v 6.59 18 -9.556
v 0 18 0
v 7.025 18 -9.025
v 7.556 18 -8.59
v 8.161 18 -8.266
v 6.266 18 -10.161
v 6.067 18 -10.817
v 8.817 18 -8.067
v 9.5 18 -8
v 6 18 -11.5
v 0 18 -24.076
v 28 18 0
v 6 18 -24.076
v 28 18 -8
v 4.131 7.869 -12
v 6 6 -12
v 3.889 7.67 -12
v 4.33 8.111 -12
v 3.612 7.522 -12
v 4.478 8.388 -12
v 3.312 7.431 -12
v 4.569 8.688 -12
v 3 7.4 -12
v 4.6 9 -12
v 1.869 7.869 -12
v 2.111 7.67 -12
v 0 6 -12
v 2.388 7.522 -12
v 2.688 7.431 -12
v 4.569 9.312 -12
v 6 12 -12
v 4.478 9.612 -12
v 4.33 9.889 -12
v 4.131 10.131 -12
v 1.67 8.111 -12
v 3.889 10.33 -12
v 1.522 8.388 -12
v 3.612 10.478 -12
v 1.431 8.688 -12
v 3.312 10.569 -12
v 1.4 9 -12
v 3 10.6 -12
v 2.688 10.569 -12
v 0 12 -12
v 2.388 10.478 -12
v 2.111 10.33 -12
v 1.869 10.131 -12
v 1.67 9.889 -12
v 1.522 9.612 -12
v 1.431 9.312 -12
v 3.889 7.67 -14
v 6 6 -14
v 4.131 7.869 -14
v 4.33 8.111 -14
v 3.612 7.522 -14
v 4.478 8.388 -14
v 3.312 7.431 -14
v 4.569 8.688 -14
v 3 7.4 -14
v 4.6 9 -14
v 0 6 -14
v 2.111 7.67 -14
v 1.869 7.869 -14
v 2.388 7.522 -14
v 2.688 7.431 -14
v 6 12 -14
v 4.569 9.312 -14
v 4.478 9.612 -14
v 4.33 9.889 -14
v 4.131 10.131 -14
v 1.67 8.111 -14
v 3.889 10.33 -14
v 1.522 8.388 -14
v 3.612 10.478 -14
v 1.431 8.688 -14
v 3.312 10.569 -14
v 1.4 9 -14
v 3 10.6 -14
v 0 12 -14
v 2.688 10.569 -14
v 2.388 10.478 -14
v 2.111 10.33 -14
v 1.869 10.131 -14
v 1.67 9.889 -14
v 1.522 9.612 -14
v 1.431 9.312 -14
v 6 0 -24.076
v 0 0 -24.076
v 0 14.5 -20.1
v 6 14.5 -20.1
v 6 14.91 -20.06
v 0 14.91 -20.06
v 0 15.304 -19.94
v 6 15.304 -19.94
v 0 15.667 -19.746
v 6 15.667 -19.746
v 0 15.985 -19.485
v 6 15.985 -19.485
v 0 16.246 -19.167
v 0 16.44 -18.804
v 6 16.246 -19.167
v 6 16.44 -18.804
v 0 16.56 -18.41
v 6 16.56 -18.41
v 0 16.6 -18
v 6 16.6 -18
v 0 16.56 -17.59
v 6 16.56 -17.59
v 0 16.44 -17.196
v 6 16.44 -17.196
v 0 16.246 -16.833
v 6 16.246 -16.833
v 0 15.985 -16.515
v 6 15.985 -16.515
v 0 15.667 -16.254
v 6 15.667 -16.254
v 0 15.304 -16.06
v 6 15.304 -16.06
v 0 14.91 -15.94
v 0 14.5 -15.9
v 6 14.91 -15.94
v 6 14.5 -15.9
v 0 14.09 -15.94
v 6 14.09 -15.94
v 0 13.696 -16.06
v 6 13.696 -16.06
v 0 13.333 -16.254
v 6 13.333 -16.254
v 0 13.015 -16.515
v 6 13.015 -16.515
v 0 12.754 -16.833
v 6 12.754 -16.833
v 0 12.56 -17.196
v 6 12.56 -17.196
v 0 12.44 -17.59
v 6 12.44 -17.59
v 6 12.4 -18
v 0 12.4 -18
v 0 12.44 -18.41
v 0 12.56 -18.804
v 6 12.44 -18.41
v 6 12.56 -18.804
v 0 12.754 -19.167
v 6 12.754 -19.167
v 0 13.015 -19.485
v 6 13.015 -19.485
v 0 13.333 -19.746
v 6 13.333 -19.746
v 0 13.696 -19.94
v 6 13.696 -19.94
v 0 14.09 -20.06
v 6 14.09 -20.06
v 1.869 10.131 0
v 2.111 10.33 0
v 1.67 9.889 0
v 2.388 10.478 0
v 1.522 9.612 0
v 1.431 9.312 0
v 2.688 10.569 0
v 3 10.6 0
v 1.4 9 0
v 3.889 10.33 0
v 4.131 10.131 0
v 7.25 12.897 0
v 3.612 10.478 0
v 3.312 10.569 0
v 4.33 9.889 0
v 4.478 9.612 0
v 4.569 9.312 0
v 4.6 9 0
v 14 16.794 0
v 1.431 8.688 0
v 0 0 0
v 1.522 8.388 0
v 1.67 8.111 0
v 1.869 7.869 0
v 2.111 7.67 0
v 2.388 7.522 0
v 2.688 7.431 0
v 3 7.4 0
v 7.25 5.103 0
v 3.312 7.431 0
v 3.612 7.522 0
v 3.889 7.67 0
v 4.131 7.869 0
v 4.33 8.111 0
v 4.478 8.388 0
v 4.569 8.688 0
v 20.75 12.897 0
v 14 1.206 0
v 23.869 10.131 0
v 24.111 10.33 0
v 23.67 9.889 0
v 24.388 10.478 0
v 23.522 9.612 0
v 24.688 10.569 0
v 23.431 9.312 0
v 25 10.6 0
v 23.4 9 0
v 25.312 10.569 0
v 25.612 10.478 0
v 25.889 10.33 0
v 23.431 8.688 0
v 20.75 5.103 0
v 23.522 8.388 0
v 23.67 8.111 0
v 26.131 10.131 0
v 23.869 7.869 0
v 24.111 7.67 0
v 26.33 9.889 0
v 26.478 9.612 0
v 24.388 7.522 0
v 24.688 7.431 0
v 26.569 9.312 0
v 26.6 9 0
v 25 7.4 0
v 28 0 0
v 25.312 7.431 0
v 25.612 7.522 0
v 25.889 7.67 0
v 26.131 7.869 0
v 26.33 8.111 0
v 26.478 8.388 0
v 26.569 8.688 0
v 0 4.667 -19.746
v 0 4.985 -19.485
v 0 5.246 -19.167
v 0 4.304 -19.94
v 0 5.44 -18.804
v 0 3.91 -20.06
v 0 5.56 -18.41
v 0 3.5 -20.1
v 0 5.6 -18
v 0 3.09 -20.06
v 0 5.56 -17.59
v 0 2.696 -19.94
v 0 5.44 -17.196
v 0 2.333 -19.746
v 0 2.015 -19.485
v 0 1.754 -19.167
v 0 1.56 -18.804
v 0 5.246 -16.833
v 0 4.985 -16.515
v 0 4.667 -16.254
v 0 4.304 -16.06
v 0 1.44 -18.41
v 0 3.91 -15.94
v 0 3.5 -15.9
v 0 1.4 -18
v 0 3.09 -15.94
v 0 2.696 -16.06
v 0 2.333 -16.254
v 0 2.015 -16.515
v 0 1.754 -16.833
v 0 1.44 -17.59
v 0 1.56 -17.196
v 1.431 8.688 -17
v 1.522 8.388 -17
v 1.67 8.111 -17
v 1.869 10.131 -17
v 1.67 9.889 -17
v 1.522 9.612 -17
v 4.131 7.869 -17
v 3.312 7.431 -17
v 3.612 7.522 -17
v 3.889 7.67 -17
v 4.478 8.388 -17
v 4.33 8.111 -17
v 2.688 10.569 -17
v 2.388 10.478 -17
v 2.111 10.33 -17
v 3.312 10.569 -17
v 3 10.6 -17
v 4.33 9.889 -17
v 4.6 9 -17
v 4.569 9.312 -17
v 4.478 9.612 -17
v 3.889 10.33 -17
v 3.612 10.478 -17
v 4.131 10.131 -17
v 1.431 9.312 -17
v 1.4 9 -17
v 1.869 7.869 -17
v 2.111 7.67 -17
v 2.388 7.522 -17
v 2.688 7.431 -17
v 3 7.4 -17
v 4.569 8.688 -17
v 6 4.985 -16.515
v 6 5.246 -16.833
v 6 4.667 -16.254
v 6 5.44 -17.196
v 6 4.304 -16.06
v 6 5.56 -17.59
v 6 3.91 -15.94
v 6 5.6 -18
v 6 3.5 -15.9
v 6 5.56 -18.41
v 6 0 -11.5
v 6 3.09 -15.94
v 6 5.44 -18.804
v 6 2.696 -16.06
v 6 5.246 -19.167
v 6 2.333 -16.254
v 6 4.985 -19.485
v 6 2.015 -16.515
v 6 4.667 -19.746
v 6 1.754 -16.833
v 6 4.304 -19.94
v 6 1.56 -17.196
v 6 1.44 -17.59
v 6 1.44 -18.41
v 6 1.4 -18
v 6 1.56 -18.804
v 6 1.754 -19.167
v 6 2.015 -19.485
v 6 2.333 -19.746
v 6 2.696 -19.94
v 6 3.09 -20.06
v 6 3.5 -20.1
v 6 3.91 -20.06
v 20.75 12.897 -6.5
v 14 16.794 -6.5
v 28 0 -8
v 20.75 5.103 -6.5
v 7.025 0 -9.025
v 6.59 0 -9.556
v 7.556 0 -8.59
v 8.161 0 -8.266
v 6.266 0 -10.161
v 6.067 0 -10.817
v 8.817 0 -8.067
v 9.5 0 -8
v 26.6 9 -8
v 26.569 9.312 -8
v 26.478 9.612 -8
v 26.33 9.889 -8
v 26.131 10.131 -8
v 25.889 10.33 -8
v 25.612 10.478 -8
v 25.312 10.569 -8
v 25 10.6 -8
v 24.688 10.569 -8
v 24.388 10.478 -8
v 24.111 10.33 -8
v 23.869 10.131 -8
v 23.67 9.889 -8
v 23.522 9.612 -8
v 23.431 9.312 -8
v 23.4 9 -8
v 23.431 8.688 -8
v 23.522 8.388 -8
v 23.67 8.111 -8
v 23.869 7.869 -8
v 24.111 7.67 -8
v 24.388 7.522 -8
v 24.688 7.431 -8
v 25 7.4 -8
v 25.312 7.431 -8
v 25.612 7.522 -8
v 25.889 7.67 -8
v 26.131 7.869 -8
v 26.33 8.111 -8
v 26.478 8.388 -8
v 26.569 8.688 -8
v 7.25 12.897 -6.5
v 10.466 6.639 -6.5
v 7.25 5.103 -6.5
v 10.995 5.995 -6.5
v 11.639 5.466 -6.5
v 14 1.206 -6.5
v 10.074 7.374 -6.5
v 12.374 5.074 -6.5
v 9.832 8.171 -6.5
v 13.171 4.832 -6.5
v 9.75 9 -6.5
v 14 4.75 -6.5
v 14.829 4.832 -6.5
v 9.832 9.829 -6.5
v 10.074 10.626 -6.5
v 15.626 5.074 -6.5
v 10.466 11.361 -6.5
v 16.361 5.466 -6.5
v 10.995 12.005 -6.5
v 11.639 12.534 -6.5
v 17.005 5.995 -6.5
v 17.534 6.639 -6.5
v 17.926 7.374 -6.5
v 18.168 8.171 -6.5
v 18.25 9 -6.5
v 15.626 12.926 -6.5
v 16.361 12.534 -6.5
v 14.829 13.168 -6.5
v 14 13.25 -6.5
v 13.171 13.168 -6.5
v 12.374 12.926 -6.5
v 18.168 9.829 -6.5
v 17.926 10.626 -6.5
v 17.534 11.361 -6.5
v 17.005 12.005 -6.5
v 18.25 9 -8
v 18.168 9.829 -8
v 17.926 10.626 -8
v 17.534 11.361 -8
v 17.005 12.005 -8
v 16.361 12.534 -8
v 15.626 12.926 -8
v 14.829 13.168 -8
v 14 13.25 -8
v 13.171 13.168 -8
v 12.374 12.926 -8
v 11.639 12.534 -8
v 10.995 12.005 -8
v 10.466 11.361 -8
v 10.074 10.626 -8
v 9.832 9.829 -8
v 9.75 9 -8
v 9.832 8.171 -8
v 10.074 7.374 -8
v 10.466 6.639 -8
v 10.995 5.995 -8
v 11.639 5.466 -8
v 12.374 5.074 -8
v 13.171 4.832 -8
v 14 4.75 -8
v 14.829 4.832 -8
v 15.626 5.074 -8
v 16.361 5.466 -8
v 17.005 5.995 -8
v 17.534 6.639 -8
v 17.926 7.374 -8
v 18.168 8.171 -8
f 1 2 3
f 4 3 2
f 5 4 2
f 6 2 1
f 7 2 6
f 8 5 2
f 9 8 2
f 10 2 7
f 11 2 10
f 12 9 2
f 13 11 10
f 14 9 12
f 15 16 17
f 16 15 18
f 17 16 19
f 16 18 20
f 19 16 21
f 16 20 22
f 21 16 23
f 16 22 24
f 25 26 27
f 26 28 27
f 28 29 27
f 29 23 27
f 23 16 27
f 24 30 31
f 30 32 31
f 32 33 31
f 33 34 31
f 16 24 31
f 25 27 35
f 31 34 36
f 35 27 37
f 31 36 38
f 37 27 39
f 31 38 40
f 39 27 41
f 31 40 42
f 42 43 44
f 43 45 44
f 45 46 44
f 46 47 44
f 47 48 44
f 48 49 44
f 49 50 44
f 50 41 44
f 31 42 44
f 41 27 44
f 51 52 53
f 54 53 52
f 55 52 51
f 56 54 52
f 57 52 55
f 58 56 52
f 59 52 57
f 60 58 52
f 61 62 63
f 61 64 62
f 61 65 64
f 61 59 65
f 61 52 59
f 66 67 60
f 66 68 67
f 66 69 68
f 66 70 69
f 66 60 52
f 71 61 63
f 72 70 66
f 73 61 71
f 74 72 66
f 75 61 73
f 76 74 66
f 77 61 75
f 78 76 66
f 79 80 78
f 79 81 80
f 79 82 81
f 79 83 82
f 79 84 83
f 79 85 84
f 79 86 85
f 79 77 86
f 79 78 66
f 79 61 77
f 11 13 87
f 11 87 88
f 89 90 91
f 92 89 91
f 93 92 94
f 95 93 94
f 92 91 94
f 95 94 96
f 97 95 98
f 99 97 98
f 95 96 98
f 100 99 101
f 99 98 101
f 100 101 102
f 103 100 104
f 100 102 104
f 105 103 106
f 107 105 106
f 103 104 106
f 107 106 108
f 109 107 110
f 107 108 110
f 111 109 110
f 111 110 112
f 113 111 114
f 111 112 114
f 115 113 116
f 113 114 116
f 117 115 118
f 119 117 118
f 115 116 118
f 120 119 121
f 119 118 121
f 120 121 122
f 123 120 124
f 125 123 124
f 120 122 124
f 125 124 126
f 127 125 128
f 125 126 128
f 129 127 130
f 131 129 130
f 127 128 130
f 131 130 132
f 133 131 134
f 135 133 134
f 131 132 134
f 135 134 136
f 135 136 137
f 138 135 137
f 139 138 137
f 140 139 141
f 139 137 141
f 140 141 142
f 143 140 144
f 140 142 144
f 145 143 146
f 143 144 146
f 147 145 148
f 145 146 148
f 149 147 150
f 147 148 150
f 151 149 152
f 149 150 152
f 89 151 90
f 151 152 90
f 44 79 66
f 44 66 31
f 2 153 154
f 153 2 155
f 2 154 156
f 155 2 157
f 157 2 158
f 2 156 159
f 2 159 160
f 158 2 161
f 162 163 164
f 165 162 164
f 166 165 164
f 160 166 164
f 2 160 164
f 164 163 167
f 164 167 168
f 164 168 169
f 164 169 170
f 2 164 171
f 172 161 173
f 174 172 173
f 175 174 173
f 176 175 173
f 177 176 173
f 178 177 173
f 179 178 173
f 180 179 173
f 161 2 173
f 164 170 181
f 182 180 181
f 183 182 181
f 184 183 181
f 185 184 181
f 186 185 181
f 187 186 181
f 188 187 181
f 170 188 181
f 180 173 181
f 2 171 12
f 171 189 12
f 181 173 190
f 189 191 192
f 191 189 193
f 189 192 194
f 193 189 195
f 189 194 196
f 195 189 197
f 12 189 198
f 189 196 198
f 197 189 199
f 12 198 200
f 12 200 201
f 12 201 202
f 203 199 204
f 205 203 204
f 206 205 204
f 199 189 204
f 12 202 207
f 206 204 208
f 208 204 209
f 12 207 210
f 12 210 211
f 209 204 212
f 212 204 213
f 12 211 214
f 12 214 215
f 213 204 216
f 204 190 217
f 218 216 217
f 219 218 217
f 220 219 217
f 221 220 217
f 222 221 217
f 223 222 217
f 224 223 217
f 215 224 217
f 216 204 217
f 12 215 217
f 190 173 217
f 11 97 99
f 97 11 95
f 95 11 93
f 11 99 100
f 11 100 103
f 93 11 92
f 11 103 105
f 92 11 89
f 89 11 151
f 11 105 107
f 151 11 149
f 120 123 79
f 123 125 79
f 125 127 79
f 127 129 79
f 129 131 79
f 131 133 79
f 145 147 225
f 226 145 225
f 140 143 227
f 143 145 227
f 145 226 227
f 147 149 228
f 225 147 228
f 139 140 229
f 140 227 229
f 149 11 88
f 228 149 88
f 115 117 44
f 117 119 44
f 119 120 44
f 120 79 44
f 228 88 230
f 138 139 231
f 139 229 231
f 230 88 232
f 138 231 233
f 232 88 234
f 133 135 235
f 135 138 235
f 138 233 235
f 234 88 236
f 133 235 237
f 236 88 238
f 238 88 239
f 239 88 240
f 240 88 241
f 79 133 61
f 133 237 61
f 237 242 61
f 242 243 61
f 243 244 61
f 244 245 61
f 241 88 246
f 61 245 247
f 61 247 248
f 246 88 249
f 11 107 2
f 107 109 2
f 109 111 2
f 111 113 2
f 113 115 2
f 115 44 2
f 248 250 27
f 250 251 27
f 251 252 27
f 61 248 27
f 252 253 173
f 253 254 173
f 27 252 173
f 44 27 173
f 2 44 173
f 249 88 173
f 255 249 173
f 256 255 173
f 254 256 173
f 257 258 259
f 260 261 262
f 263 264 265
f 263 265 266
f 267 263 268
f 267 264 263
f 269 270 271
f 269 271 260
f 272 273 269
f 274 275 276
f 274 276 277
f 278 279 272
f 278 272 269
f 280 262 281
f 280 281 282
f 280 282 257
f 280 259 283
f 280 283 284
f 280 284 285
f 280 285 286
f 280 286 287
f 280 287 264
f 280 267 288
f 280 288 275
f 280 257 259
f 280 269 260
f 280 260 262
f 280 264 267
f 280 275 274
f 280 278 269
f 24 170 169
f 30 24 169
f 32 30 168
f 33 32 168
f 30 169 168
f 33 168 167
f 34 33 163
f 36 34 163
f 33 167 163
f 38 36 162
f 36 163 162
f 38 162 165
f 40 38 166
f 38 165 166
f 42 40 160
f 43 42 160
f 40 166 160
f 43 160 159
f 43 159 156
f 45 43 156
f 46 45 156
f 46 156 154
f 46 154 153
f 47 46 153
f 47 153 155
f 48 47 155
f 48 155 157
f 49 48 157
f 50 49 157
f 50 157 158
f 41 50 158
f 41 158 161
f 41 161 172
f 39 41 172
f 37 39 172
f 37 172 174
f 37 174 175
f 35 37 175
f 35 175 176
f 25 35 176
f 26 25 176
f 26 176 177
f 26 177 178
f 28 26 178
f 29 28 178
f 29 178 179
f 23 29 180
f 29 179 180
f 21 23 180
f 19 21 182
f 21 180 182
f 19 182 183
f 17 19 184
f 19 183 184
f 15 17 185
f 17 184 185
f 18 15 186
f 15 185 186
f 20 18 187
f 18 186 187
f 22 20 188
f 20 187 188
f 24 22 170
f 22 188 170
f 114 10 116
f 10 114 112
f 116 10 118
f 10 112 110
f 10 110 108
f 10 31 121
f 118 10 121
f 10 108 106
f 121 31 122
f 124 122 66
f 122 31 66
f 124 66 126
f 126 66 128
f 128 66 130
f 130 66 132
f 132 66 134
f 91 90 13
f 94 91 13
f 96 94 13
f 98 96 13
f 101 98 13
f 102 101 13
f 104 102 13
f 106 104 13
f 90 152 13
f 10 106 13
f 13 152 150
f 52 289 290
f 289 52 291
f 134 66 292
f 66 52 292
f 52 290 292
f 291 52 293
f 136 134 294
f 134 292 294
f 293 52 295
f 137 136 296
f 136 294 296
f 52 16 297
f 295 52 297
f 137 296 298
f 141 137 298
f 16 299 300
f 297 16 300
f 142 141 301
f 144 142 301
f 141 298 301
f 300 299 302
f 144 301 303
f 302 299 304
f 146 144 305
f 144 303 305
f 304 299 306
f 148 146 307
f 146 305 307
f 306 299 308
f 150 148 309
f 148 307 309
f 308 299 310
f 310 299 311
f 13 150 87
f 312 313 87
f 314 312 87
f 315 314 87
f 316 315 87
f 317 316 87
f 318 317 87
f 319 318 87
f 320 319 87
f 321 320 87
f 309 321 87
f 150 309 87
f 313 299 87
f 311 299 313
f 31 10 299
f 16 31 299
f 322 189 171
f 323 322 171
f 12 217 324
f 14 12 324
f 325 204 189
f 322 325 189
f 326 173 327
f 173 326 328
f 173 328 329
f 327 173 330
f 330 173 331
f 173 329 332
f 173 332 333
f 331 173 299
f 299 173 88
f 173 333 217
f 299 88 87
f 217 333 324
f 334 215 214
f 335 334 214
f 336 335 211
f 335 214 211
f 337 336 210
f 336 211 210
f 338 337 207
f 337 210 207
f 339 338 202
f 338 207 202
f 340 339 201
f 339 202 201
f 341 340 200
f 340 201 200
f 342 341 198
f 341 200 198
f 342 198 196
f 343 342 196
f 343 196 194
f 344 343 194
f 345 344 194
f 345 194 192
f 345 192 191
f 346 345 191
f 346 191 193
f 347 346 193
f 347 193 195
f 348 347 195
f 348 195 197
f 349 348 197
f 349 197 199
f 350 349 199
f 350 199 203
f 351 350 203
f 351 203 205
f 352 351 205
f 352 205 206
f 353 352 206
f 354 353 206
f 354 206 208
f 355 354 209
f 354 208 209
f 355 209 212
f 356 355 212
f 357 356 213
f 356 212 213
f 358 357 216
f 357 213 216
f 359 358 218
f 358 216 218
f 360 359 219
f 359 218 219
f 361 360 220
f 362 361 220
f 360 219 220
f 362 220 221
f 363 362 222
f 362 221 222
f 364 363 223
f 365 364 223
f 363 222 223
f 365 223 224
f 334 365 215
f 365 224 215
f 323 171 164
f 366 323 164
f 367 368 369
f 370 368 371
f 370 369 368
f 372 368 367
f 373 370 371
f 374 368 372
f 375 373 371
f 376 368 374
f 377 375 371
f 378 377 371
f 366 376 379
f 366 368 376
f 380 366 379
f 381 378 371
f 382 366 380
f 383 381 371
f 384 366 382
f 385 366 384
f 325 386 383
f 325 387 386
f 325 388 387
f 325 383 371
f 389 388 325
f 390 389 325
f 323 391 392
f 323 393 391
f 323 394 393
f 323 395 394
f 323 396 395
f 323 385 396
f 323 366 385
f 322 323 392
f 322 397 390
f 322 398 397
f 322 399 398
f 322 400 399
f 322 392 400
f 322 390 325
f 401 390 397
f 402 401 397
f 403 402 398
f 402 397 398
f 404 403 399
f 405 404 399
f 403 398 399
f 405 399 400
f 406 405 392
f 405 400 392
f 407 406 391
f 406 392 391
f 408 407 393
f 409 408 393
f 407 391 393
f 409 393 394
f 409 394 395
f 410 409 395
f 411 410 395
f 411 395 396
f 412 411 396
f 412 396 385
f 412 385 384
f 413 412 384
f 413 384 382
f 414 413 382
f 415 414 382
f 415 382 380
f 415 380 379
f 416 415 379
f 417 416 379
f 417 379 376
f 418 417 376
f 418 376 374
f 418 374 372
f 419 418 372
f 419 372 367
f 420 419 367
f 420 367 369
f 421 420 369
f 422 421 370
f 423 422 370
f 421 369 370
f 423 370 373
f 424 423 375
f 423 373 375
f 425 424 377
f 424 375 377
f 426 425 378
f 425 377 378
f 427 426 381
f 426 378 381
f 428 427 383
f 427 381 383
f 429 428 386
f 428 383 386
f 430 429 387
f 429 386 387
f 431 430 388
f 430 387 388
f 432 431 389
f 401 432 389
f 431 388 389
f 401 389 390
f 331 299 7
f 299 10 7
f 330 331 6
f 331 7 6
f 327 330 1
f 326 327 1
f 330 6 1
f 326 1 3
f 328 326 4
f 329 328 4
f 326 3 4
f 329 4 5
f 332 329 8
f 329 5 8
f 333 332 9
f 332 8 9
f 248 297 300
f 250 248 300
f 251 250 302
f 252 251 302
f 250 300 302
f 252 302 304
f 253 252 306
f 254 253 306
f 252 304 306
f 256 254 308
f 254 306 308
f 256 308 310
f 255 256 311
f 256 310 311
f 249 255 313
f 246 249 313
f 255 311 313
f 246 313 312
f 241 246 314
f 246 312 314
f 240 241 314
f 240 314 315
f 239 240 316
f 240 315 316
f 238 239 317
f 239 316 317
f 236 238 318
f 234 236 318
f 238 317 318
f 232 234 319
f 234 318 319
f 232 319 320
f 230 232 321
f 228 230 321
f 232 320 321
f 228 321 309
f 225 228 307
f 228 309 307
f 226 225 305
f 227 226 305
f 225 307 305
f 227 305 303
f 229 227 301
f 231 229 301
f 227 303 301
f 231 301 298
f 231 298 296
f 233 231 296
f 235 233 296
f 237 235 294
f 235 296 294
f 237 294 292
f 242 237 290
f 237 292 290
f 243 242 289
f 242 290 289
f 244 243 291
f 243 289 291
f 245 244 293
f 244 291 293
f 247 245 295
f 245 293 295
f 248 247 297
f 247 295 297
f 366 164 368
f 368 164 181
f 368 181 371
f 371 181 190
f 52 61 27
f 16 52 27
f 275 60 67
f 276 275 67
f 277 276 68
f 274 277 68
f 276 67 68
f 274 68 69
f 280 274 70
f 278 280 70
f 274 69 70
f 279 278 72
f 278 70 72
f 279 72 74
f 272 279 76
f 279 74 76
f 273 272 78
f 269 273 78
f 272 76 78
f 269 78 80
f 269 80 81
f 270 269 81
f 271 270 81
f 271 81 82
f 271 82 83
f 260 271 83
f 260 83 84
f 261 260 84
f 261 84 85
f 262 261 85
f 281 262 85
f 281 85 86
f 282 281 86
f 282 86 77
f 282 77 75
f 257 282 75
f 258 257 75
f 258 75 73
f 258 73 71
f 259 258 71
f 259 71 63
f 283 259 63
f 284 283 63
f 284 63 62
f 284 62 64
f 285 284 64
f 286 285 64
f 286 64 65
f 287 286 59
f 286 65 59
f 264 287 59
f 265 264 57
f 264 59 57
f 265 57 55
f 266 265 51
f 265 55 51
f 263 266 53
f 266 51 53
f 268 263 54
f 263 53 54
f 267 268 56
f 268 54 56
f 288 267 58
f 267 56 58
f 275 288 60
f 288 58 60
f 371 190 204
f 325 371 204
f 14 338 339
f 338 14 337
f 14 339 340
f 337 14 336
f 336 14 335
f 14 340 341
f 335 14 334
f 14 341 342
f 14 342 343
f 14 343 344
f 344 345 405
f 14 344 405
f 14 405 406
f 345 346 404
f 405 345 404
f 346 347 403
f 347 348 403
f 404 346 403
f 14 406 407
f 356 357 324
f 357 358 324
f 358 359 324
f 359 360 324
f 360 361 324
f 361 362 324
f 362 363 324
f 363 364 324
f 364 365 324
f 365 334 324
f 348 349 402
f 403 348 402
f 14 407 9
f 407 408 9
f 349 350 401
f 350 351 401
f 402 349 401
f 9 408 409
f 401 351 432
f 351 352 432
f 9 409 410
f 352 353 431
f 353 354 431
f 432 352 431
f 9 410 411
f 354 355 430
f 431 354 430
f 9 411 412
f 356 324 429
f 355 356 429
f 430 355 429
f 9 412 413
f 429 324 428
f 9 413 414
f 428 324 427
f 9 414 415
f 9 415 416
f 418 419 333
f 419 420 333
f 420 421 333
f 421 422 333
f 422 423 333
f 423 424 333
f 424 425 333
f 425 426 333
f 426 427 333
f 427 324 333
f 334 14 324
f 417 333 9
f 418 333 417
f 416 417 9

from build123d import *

# Parameters (mm, degrees)
BOSS_EXTRUDE1_DEPTH = 18
CUT_EXTRUDE1_DEPTH  = 6.5
SKETCH4_R           = 1.6
CUT_EXTRUDE2_DEPTH  = 17
SKETCH5_W           = 2
SKETCH5_H           = 6
CUT_EXTRUDE3_DEPTH  = 6
SKETCH6_R           = 4.25
CUT_EXTRUDE4_DEPTH  = 6
FILLET1_R           = 3.5
SKETCH7_R           = 2.1
CUT_EXTRUDE5_DEPTH  = 6


with BuildPart() as part:
    # Sketch1 → Boss-Extrude1 (new body)
    with BuildSketch(Plane(origin=(0, 0, 0), x_dir=(1, 0, 0), z_dir=(0, 1, 0))):
        Polygon((0, 24.076190476), (0, 0), (28, 0), (28, 8), (6, 8), (6, 24.076190476), align=None)
    extrude(amount=BOSS_EXTRUDE1_DEPTH)

    # Sketch3 → Cut-Extrude1 (cut)
    with BuildSketch(Plane.XY):
        Polygon((20.75, 5.102885683), (20.75, 12.897114317), (14, 16.794228634), (7.25, 12.897114317), (7.25, 5.102885683), (14, 1.205771366), align=None)
    extrude(amount=-CUT_EXTRUDE1_DEPTH, mode=Mode.SUBTRACT)

    # Sketch4 → Cut-Extrude2 (cut)
    with BuildSketch(Plane.XY):
        with Locations((25, 9)):
            Circle(SKETCH4_R)
        with Locations((3, 9)):
            Circle(SKETCH4_R)
    extrude(amount=-CUT_EXTRUDE2_DEPTH, mode=Mode.SUBTRACT)

    # Sketch5 → Cut-Extrude3 (cut)
    with BuildSketch(Plane.ZY):
        with Locations((-13, 9)):
            Rectangle(SKETCH5_W, SKETCH5_H)
    extrude(amount=-CUT_EXTRUDE3_DEPTH, mode=Mode.SUBTRACT)

    # Sketch6 → Cut-Extrude4 (cut)
    with BuildSketch(Plane.XY.offset(-6.5)):
        with Locations((14, 9)):
            Circle(SKETCH6_R)
    extrude(amount=-CUT_EXTRUDE4_DEPTH, mode=Mode.SUBTRACT)

    # Fillet1
    fillet1_edges = [part.edges().sort_by_distance(p)[0] for p in [
        (6, 9, -8),
    ]]
    fillet(fillet1_edges, radius=FILLET1_R)

    # Sketch7 → Cut-Extrude5 (cut)
    with BuildSketch(Plane(origin=(6, 0, 0), x_dir=(0, 0, -1), z_dir=(1, 0, 0))):
        with Locations((18, 14.5)):
            Circle(SKETCH7_R)
        with Locations(Location((18, 3.5, 0), (0, 0, 180))):
            Circle(SKETCH7_R)
    extrude(amount=-CUT_EXTRUDE5_DEPTH, mode=Mode.SUBTRACT)


solid = part.part
